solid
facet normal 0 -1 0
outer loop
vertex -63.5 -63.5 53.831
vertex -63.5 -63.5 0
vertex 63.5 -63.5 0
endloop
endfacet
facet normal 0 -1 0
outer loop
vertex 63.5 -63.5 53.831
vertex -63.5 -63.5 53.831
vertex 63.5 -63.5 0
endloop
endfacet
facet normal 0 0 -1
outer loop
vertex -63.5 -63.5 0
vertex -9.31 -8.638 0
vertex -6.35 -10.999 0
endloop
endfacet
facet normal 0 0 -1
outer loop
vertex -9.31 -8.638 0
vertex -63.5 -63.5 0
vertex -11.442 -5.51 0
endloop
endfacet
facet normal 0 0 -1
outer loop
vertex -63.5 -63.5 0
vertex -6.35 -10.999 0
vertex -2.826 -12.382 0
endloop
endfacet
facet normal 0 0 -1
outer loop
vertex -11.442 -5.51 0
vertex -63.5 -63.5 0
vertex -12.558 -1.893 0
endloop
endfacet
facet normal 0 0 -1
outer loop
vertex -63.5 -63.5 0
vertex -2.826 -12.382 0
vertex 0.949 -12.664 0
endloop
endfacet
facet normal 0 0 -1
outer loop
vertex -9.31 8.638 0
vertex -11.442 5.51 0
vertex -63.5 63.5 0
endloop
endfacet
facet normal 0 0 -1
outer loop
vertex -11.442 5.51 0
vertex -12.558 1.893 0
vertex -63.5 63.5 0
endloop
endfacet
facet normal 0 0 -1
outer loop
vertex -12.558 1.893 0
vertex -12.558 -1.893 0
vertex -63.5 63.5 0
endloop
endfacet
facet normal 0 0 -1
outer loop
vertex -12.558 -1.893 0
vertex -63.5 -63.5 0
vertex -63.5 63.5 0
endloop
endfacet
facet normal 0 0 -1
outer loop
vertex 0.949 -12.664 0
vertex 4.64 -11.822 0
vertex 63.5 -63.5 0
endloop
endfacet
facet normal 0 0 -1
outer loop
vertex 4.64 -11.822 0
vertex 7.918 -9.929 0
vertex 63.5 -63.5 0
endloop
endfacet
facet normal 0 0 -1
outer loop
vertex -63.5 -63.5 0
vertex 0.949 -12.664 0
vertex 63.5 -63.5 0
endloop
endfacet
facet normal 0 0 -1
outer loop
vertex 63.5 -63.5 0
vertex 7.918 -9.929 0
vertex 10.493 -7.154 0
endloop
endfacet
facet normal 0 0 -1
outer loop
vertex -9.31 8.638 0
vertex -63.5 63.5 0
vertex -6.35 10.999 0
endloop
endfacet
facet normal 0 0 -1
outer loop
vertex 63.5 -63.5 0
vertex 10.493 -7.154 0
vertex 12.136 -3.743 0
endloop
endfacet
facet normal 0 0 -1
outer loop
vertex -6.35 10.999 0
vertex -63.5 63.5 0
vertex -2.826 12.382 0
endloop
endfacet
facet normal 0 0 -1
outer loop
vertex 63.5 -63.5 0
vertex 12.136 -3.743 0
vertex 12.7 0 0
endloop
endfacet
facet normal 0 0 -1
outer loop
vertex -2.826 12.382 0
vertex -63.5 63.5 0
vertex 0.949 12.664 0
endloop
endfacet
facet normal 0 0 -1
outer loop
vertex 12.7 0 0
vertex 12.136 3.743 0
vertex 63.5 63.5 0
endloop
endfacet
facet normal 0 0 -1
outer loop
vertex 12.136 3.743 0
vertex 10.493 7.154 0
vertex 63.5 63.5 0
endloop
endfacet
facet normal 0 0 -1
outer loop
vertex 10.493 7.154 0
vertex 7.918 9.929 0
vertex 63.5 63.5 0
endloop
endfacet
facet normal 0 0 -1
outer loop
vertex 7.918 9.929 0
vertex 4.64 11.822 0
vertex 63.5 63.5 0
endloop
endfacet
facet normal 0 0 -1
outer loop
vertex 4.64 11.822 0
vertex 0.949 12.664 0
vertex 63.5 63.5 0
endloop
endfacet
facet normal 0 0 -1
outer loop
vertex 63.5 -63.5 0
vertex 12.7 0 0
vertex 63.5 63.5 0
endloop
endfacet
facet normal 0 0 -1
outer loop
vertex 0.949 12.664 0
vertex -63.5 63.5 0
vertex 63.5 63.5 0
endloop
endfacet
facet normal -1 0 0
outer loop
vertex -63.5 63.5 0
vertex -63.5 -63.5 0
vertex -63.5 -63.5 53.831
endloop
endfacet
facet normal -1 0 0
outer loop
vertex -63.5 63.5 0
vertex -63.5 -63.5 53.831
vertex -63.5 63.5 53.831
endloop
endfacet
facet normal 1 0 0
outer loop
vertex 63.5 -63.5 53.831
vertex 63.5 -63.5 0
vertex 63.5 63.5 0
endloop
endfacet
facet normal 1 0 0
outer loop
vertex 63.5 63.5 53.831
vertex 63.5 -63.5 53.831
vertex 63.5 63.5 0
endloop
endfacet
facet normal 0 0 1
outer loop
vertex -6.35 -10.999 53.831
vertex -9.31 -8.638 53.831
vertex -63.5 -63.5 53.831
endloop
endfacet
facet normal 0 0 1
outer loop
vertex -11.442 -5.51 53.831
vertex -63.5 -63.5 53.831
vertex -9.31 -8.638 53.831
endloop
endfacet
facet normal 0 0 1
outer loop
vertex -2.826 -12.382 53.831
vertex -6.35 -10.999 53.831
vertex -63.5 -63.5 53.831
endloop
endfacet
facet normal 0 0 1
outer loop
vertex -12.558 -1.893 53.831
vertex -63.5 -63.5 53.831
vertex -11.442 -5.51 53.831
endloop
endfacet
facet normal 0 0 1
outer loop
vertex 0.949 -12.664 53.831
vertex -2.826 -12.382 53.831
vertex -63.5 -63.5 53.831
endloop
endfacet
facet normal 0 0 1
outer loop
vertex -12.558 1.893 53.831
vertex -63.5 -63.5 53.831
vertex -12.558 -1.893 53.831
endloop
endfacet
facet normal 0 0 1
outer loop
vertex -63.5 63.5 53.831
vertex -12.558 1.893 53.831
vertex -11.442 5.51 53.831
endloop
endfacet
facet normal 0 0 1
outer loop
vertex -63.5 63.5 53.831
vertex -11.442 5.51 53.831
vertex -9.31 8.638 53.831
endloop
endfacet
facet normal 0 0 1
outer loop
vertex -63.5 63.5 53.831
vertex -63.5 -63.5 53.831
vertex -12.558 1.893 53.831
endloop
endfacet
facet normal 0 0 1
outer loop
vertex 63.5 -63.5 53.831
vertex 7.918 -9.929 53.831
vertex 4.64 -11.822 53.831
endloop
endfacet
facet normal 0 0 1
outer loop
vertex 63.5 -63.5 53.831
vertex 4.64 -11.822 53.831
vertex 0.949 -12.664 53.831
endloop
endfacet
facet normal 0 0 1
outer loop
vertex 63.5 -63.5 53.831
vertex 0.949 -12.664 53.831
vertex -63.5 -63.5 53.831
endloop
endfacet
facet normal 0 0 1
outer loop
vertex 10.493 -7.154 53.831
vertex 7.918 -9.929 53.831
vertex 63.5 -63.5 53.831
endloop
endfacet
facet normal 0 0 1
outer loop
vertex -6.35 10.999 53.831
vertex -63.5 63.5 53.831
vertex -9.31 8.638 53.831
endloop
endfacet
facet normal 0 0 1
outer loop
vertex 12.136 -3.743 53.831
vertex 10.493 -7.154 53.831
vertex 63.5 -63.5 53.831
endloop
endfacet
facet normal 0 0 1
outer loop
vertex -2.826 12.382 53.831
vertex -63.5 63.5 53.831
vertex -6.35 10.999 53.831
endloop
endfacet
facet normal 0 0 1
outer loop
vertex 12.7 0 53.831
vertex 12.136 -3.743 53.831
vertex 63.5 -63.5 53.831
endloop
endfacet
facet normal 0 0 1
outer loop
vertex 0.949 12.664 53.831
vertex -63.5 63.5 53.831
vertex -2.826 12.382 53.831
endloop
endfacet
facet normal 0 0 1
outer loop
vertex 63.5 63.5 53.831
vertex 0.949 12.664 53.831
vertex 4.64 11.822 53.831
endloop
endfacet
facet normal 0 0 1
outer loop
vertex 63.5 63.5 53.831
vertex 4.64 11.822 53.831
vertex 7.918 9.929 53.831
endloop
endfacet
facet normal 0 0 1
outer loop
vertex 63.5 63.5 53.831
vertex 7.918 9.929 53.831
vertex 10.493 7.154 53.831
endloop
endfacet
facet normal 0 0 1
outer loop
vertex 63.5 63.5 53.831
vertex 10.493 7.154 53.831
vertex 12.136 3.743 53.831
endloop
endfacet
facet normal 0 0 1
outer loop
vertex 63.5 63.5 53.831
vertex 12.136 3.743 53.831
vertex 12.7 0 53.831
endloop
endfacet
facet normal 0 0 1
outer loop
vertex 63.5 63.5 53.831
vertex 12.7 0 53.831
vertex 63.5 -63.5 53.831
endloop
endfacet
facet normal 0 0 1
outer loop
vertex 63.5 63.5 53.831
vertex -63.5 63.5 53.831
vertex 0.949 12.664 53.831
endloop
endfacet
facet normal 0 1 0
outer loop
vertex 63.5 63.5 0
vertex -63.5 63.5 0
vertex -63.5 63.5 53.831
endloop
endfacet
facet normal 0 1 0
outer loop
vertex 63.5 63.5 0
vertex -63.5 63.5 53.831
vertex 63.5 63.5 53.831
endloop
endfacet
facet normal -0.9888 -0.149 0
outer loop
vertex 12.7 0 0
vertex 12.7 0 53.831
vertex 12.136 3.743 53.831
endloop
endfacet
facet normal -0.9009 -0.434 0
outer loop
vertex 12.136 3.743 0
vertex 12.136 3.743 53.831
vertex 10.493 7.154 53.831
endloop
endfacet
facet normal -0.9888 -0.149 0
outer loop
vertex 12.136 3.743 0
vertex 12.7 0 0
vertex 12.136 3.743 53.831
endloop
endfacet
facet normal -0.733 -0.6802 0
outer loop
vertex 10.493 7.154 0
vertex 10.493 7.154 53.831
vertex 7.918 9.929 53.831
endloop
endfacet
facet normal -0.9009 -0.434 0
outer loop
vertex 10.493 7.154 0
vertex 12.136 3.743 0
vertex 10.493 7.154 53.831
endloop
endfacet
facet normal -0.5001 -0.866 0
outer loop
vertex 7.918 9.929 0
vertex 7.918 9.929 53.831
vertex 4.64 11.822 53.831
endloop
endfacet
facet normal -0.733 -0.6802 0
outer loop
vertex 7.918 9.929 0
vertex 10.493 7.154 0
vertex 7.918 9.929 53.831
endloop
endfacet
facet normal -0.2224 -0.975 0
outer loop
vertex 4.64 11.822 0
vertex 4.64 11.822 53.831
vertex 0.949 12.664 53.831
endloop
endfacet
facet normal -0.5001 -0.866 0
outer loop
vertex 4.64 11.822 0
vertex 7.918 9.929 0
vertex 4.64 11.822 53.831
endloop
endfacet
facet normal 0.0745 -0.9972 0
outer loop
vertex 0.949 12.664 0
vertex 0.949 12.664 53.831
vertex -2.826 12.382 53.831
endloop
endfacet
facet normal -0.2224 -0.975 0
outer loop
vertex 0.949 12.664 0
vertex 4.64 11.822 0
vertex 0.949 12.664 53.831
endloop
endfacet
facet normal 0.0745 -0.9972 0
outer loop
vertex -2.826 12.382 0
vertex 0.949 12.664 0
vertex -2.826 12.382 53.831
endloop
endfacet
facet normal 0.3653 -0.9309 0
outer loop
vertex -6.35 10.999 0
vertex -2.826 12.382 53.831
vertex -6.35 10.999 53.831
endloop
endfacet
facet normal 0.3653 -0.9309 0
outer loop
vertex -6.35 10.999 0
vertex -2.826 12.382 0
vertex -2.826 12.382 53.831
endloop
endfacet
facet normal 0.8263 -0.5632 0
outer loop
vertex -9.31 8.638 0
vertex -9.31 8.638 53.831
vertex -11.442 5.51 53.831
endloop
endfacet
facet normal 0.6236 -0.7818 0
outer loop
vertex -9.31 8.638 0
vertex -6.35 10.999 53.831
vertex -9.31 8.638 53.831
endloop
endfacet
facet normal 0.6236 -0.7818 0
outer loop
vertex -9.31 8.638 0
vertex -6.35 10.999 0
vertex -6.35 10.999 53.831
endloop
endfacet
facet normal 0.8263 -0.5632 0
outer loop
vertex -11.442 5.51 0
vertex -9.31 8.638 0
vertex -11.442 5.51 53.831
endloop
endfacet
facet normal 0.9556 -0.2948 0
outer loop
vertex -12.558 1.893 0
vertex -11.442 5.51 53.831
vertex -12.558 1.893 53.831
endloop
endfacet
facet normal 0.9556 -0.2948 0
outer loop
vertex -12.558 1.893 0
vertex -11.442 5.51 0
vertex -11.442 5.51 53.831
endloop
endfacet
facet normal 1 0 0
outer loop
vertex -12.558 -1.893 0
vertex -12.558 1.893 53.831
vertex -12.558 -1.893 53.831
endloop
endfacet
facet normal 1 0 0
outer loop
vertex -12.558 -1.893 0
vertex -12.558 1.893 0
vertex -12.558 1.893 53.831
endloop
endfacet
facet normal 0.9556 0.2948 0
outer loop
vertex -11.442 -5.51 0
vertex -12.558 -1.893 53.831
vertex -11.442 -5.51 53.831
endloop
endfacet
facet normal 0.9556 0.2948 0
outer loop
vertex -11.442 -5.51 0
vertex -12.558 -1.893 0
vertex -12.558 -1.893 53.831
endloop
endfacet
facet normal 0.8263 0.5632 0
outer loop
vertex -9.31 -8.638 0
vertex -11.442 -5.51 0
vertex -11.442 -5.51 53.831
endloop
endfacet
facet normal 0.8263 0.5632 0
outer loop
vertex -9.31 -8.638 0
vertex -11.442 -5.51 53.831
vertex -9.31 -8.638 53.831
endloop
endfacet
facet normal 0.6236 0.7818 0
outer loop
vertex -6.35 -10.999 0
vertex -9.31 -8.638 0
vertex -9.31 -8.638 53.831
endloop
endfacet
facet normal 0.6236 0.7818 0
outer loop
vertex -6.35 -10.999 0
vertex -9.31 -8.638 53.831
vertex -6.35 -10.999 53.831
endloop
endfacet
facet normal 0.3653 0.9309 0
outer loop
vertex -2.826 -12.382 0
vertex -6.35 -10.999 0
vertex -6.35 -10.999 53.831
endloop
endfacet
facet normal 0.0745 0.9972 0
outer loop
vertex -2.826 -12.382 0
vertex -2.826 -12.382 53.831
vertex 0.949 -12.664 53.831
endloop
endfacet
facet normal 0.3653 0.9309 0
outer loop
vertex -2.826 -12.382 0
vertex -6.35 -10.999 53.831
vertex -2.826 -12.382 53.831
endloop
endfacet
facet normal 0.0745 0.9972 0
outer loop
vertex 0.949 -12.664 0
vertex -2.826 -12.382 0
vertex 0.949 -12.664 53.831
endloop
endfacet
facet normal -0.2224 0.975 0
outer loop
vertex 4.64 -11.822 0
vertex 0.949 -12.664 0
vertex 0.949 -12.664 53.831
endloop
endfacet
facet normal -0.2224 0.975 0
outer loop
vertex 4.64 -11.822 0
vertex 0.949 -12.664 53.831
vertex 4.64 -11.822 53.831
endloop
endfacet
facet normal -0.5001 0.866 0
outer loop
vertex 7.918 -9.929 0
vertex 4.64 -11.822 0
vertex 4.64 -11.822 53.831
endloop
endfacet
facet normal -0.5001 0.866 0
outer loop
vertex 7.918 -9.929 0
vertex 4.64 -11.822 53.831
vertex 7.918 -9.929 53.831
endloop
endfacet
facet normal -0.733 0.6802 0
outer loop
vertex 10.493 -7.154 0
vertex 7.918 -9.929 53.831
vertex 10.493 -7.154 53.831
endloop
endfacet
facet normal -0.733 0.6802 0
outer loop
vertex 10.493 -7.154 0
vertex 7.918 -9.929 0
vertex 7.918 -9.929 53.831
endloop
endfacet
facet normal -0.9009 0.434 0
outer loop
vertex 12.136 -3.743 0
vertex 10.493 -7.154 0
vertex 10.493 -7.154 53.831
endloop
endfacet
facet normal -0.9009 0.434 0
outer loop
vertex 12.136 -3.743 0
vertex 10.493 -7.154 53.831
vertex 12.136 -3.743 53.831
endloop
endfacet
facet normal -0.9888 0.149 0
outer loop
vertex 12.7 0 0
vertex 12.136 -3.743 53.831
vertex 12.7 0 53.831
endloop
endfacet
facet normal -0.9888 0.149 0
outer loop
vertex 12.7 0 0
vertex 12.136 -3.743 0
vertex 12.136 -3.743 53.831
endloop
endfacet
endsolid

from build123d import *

# Parameters (mm, degrees)
F0_R     = 12.7
F1_DEPTH = 152.4
F2_W     = 127
F2_H     = 127
F3_DEPTH = 53.830817


with BuildPart() as f1:
    # F0 (on Top) → F1 (new body)
    with BuildSketch(Plane.XY):
        Circle(F0_R)
    extrude(amount=F1_DEPTH)


with BuildPart() as f3:
    # F2 (on Top) → F3 (new body)
    with BuildSketch(Plane.XY):
        Rectangle(F2_W, F2_H)
    extrude(amount=F3_DEPTH)

    # F4: cut F1
    add(f1.part, mode=Mode.SUBTRACT)


solid = f3.part
